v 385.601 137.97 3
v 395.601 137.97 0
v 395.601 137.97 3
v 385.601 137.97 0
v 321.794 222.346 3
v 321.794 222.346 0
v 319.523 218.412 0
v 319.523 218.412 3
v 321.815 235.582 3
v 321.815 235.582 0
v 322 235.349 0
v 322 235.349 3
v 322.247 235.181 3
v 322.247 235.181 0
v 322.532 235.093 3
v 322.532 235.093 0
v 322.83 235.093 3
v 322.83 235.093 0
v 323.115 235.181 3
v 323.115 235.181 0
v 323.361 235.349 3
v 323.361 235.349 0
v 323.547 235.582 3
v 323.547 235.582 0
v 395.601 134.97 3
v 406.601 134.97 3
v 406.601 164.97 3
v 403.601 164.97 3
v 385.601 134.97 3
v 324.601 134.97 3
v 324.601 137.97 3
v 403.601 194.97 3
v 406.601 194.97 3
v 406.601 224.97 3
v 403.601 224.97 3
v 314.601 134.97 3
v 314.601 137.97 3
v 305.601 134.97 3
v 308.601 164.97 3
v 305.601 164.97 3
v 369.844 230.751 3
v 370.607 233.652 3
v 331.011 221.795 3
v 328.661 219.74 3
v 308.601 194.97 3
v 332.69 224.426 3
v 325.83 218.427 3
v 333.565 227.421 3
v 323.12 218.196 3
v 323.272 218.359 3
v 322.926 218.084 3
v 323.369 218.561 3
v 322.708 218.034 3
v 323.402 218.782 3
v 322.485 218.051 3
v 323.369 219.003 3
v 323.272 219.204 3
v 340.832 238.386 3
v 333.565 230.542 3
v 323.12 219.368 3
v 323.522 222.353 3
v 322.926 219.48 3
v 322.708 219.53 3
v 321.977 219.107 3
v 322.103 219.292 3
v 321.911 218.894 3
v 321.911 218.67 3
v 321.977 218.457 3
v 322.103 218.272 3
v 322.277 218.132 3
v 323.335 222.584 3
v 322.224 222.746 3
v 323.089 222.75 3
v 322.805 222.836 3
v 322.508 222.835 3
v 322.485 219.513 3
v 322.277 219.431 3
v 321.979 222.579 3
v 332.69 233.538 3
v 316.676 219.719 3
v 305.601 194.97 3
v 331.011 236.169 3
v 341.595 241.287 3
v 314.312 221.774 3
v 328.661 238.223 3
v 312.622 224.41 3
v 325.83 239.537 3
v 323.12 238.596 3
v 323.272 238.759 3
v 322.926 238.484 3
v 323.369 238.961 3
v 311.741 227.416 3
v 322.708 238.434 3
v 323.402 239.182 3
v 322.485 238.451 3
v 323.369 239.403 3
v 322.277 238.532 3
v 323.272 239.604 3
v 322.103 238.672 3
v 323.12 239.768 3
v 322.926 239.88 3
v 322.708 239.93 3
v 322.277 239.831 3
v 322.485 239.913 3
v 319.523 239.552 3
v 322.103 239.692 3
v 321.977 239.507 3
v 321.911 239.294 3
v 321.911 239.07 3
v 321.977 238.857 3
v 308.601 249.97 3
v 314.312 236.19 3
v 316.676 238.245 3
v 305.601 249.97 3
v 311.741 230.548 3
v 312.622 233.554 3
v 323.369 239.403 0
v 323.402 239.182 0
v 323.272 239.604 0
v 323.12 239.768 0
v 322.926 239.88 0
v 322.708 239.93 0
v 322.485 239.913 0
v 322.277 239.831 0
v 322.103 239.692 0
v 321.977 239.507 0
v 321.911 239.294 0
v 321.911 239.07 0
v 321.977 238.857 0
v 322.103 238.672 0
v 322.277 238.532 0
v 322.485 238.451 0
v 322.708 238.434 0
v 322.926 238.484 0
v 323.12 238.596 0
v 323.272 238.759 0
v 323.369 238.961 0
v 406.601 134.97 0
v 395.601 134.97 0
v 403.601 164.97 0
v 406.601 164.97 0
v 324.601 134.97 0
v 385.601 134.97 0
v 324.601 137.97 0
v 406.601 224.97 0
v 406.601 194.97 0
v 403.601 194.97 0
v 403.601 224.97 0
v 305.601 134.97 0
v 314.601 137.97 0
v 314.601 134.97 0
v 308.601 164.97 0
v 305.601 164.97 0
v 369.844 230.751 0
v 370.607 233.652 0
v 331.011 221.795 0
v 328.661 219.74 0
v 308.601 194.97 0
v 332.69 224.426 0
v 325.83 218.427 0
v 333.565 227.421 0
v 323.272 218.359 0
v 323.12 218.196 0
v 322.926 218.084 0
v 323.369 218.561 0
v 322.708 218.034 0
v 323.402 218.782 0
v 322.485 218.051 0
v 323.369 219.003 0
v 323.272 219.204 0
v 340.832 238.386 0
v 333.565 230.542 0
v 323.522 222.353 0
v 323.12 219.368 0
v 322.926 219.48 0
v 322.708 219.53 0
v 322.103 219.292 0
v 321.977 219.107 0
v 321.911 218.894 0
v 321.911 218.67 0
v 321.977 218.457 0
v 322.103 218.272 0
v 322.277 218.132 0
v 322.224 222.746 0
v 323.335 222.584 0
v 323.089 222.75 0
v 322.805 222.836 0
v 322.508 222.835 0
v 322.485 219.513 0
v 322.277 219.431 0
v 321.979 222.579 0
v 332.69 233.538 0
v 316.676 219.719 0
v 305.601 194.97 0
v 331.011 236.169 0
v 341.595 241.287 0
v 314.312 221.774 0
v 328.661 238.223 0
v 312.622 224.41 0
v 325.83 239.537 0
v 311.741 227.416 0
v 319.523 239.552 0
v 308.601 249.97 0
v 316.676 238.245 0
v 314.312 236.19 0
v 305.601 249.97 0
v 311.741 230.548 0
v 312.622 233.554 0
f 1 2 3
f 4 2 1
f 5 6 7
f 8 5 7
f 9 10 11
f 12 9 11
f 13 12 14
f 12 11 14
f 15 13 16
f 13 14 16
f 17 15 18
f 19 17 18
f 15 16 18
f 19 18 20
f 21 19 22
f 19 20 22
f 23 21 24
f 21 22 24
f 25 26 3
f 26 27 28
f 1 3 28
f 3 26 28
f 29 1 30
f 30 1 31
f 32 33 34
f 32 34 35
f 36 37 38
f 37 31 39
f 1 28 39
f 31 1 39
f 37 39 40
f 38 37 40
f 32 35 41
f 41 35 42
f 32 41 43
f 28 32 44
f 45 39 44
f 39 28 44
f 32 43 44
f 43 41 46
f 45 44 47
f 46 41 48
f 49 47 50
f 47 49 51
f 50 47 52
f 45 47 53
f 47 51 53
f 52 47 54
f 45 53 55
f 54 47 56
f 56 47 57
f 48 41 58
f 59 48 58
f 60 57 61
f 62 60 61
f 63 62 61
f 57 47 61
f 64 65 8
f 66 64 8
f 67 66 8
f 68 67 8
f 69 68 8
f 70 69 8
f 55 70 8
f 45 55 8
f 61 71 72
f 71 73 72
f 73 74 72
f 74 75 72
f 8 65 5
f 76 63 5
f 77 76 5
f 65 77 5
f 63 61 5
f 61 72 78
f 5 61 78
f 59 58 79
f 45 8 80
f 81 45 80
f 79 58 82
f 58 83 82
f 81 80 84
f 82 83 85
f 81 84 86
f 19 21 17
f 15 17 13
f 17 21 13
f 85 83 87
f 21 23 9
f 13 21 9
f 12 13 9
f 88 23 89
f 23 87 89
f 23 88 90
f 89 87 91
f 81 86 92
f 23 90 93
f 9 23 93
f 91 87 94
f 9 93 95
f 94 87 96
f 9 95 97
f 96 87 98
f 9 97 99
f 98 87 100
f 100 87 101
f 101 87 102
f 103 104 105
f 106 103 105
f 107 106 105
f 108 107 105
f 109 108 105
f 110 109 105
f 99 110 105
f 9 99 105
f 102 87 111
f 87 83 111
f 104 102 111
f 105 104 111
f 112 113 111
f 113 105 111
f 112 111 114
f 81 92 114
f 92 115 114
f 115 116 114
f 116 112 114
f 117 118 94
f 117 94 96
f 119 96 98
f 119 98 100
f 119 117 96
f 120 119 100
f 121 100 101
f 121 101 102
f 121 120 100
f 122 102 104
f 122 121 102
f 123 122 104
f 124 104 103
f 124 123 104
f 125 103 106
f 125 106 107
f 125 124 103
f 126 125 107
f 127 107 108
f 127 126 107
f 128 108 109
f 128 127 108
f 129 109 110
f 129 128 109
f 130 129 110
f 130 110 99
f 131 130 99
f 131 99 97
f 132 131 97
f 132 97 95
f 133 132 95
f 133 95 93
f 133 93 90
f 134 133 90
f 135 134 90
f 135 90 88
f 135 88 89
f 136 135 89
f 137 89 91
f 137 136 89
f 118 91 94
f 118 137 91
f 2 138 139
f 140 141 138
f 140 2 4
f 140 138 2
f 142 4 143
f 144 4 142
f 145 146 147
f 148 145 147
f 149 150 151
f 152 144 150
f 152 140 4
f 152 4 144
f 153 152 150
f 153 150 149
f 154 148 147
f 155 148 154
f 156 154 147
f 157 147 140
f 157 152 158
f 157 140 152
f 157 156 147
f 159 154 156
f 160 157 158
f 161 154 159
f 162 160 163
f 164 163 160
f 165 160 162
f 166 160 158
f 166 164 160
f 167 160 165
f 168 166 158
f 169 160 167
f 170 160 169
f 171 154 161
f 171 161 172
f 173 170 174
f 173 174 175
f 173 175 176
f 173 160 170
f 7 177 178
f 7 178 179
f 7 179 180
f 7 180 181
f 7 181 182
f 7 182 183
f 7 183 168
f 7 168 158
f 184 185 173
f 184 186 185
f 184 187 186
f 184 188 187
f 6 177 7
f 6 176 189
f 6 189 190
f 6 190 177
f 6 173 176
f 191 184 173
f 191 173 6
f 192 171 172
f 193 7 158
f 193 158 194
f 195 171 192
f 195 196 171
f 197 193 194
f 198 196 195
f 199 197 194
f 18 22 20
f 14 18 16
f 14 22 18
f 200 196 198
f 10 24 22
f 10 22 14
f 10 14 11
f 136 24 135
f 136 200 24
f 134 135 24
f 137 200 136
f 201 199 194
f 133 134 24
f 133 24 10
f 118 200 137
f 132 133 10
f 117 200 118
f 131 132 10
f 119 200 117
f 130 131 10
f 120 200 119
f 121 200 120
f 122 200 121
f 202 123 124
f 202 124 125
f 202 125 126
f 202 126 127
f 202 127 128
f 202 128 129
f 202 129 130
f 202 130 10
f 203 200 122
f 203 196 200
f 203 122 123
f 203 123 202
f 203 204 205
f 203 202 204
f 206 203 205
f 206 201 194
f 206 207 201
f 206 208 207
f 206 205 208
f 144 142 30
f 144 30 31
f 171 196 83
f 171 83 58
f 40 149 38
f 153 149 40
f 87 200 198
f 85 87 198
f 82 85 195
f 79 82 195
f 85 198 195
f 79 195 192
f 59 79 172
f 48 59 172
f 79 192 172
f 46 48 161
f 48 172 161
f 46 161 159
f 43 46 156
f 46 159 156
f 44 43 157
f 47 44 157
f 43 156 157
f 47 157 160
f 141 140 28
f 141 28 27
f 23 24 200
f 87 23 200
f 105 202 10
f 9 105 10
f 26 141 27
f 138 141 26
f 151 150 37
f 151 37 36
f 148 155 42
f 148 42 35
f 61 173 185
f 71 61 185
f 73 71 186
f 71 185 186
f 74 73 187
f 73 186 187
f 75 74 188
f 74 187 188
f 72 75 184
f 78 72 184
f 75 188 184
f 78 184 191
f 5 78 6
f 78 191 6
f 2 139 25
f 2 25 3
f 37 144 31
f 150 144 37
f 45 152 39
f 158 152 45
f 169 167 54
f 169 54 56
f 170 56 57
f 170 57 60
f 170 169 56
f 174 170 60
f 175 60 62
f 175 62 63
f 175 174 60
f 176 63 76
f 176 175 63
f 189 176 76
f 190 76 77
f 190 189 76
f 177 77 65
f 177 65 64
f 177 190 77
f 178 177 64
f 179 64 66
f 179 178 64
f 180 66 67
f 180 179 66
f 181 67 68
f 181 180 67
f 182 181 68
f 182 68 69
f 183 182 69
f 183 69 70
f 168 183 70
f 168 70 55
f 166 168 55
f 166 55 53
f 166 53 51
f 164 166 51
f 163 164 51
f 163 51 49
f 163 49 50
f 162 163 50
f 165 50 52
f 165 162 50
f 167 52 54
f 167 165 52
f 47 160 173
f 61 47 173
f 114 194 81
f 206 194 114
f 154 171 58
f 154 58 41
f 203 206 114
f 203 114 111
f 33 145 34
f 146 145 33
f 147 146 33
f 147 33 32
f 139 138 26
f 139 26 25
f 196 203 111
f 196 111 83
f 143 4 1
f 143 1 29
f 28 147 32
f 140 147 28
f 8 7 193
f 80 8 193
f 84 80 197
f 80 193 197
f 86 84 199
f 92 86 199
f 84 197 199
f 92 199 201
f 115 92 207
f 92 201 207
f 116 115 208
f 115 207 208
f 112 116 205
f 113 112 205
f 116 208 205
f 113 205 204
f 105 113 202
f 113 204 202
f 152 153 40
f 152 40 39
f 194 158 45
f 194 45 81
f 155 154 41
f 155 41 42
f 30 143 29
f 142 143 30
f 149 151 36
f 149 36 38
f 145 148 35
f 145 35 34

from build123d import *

# Parameters (mm, degrees)
MODEL_R             = 0.75
BOSS_EXTRUDE1_DEPTH = 3


with BuildPart() as part:
    # Model → Boss-Extrude1 (new body)
    with BuildSketch(Plane.XY):
        Polygon((403.601129512, 194.969765788), (403.601129512, 164.969765788), (406.601129512, 164.969765788), (406.601129512, 134.969765788), (395.601129512, 134.969765788), (395.601129512, 137.969765788), (385.601129512, 137.969765788), (385.601129512, 134.969765788), (324.601129512, 134.969765788), (324.601129512, 137.969765788), (314.601129512, 137.969765788), (314.601129512, 134.969765788), (305.601129512, 134.969765788), (305.601129512, 164.969765788), (308.601129512, 164.969765788), (308.601129512, 194.969765788), (305.601129512, 194.969765788), (305.601129512, 249.969765788), (308.601129512, 249.969765788), (341.595011453, 241.287165277), (340.831531555, 238.385941665), (369.843767673, 230.751142687), (370.607247571, 233.652366299), (403.601129512, 224.969765788), (406.601129512, 224.969765788), (406.601129512, 194.969765788), align=None)
        with Locations((322.652388944, 239.181914498)):
            Circle(MODEL_R, mode=Mode.SUBTRACT)
        with Locations((322.652388944, 218.781914498)):
            Circle(MODEL_R, mode=Mode.SUBTRACT)
        with BuildLine():
            Line((319.522778631, 239.551528485), (321.814644014, 235.581901198))
            ThreePointArc((321.814644014, 235.581901198), (322.680669418, 235.081901198), (323.546694821, 235.581901198))
            Line((323.546694821, 235.581901198), (325.830243575, 239.537123662))
            ThreePointArc((325.830243575, 239.537123662), (333.675600842, 228.981914498), (325.830243575, 218.426705335))
            Line((325.830243575, 218.426705335), (323.522241062, 222.353132192))
            ThreePointArc((323.522241062, 222.353132192), (322.656242047, 222.846375297), (321.794122171, 222.346382924))
            Line((321.794122171, 222.346382924), (319.522778631, 218.412300511))
            ThreePointArc((319.522778631, 218.412300511), (311.629177046, 228.981914498), (319.522778631, 239.551528485))
        make_face(mode=Mode.SUBTRACT)
    extrude(amount=BOSS_EXTRUDE1_DEPTH)


solid = part.part
